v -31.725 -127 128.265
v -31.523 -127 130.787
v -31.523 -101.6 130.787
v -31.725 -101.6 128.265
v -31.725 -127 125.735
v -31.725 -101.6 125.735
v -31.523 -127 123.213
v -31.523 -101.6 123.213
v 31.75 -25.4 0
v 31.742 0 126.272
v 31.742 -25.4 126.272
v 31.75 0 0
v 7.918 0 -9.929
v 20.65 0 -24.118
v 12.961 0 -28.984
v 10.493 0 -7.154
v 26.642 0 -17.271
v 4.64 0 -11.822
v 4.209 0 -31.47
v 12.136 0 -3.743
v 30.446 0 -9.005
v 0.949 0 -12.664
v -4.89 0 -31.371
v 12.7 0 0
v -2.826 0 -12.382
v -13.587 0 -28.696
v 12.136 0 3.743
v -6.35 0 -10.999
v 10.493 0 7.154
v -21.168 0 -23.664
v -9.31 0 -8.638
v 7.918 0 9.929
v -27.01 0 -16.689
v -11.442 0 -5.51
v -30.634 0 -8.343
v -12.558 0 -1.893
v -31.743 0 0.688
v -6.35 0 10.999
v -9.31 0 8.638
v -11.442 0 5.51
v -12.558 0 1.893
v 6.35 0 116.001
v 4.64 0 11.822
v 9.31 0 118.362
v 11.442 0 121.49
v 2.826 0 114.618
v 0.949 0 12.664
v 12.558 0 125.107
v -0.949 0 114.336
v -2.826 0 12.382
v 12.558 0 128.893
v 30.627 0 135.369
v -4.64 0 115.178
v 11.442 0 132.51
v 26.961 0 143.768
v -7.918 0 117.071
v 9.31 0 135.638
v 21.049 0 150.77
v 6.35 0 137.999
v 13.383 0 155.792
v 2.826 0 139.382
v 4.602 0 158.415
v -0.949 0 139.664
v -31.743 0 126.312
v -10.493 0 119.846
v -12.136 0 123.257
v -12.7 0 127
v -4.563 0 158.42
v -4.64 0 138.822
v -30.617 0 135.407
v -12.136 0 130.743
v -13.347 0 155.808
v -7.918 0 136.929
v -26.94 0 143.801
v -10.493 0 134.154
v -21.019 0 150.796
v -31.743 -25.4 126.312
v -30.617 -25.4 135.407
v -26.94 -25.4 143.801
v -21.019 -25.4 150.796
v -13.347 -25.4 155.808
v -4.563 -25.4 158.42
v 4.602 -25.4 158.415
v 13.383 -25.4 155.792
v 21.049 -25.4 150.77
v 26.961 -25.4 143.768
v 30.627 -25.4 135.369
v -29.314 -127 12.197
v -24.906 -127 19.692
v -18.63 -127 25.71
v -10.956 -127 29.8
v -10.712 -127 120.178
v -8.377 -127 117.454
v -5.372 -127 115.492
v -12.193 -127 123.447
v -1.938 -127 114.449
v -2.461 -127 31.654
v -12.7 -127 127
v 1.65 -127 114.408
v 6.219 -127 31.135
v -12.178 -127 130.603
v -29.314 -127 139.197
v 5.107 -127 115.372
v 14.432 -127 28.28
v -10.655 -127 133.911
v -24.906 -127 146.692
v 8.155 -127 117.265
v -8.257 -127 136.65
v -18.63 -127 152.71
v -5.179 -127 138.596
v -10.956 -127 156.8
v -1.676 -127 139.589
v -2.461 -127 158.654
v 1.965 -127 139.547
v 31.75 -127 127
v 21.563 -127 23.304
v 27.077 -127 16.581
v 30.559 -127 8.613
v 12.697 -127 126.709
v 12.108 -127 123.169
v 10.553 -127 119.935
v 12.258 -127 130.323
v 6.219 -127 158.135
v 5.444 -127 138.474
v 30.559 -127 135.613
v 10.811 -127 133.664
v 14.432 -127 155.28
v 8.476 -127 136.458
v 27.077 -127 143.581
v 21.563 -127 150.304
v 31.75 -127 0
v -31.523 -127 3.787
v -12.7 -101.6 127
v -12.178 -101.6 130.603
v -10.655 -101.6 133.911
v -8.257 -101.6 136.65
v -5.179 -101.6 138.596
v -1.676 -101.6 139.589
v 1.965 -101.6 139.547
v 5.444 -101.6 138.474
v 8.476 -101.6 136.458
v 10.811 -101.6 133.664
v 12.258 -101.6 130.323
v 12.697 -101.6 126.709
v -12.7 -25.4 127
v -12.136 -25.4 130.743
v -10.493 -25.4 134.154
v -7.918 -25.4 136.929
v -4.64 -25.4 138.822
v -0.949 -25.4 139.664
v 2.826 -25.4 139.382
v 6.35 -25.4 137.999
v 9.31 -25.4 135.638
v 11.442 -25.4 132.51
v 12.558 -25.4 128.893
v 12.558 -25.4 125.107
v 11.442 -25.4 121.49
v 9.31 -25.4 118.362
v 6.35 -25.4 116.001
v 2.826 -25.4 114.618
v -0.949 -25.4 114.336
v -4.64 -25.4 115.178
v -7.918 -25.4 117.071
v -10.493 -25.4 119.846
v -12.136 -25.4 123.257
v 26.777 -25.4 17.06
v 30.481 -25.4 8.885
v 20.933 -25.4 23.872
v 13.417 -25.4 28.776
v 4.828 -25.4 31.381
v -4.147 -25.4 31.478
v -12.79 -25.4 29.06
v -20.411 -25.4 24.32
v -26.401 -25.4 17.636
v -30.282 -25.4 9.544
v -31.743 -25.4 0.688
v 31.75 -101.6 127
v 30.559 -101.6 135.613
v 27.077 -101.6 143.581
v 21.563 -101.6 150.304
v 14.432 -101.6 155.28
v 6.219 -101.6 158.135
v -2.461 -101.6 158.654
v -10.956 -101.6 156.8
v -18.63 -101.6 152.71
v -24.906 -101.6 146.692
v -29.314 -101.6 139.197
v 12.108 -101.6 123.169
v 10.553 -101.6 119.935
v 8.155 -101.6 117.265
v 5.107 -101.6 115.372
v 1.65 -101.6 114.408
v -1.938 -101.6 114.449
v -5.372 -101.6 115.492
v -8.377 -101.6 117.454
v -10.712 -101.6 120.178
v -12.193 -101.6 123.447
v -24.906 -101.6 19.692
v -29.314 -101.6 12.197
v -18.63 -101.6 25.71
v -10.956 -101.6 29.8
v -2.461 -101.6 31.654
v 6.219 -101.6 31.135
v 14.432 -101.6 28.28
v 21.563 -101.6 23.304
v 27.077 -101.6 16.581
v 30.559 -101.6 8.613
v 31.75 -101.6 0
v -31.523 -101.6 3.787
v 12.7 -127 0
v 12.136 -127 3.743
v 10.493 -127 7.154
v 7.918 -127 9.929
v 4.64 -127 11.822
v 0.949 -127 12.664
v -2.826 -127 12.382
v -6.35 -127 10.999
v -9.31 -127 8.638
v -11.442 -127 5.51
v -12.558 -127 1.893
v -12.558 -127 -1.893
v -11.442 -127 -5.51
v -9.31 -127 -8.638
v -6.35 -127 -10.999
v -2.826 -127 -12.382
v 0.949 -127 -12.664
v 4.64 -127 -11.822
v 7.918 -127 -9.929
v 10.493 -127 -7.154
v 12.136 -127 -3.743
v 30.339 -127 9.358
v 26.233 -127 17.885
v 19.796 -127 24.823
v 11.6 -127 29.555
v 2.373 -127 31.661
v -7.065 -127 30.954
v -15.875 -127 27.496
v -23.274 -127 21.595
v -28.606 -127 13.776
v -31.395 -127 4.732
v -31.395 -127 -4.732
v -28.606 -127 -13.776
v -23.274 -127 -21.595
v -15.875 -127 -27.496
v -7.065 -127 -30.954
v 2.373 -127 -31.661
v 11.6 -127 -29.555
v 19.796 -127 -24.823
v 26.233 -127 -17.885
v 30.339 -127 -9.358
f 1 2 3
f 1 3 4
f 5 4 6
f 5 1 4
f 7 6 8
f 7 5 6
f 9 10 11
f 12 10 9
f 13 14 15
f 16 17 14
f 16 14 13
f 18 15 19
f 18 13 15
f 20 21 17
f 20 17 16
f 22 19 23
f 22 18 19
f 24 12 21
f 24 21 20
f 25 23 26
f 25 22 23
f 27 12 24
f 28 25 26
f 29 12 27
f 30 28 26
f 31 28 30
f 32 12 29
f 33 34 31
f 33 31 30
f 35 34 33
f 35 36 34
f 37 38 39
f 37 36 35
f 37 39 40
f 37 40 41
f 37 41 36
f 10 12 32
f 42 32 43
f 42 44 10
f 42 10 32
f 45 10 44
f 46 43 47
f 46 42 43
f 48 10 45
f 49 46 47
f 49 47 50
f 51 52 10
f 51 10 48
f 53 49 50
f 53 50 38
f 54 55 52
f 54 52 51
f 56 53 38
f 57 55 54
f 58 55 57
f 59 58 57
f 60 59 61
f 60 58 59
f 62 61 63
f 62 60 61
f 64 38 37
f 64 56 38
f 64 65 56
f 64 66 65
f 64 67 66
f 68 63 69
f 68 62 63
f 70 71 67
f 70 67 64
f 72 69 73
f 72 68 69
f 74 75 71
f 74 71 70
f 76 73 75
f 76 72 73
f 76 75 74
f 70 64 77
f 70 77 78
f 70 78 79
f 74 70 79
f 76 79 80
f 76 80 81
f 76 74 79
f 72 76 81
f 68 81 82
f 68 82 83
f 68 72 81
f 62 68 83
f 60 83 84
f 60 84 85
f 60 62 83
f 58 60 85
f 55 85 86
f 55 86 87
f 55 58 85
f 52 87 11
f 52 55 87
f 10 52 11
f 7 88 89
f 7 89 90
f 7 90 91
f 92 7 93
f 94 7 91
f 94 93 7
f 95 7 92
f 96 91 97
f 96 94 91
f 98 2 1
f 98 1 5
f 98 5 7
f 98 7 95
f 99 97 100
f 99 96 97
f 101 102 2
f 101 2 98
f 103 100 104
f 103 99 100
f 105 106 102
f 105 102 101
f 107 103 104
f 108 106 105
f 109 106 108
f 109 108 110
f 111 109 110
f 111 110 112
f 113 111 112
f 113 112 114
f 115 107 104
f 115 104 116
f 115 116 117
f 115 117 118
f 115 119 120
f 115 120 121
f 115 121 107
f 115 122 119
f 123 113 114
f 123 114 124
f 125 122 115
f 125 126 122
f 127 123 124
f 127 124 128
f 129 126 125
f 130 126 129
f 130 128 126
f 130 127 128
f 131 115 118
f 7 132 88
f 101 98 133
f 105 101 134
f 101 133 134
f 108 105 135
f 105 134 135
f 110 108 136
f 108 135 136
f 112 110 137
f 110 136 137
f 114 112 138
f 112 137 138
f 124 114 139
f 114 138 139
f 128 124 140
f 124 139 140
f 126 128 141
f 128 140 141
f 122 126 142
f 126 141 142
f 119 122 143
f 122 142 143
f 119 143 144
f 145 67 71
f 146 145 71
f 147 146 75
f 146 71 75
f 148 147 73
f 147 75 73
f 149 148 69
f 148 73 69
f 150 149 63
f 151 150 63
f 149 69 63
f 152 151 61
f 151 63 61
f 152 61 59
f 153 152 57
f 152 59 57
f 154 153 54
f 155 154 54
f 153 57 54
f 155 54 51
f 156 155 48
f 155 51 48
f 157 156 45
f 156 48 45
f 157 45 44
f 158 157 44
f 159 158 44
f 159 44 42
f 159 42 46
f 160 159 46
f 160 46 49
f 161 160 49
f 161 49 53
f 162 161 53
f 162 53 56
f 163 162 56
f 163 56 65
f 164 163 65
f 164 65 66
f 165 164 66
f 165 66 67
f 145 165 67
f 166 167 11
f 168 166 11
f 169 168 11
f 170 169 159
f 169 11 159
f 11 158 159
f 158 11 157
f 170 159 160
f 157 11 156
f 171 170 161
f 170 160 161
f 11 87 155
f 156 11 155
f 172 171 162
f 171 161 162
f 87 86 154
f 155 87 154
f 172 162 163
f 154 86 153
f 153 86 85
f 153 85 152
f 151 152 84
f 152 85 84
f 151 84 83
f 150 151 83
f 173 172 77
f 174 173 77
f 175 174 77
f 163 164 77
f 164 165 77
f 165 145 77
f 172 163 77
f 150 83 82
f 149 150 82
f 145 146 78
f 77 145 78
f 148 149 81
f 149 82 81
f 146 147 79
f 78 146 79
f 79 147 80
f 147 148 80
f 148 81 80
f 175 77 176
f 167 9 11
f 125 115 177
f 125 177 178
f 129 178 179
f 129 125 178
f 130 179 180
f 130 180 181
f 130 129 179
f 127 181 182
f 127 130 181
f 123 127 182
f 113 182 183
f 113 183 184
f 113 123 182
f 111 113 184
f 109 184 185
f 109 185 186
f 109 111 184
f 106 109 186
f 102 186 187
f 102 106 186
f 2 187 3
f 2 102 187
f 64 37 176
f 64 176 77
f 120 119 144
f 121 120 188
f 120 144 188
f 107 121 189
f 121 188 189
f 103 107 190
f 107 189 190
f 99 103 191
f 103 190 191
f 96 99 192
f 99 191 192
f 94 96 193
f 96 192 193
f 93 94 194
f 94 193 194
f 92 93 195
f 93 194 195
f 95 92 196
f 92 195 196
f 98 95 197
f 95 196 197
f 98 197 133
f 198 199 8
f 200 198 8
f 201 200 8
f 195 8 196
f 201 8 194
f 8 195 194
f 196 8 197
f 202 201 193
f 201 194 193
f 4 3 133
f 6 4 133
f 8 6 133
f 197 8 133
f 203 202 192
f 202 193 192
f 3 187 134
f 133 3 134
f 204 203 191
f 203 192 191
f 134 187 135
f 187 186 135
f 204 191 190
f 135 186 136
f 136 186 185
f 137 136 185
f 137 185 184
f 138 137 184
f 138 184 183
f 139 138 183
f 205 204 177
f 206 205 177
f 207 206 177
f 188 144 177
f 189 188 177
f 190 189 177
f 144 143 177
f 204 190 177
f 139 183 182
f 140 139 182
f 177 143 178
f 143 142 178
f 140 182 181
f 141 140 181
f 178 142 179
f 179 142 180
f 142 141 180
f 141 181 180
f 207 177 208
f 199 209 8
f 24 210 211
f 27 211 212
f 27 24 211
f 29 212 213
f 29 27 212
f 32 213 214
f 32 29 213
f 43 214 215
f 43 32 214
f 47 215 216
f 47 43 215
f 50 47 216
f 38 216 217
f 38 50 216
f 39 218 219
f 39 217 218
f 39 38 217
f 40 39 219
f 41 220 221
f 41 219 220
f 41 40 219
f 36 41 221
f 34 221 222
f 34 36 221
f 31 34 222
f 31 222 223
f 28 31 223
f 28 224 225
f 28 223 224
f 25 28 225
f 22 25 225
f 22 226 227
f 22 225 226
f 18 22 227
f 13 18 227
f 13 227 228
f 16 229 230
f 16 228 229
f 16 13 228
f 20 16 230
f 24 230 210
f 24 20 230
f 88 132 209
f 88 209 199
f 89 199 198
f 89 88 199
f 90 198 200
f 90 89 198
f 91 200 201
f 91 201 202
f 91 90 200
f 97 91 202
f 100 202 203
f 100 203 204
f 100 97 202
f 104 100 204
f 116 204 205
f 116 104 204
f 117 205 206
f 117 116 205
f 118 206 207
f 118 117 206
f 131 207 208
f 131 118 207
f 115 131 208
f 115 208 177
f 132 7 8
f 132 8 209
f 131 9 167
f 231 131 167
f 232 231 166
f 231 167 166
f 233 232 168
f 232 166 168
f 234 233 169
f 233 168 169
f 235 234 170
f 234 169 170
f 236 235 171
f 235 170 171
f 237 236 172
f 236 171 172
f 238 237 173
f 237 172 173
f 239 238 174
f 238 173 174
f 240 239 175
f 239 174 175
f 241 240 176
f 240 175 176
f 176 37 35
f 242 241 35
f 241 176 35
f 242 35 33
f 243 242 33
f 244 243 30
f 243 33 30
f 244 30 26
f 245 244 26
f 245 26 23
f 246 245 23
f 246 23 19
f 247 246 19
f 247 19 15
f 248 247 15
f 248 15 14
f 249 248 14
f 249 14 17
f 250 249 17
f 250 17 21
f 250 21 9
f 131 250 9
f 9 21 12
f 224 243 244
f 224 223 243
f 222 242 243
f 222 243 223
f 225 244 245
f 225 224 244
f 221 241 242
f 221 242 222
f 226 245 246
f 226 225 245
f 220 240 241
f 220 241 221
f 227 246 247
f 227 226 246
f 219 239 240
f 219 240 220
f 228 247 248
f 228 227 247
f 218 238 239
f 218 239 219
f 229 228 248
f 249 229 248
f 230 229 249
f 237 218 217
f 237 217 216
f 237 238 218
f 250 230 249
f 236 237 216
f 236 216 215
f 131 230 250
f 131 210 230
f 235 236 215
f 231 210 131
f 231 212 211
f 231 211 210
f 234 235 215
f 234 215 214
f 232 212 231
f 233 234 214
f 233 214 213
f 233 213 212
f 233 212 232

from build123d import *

# Parameters (mm, degrees)
F0_R     = 31.75
F0_R_2   = 12.7
F1_DEPTH = 127
F3_DEPTH = 25.4
F5_DEPTH = 25.4
F6_R     = 12.7
F7_DEPTH = 139.7
F8_R     = 12.7
F9_DEPTH = 38.1


with BuildPart() as f1:
    # F0 (on Front) → F1 (new body)
    with BuildSketch(Plane.XZ):
        Circle(F0_R)
        Circle(F0_R_2, mode=Mode.SUBTRACT)
    extrude(amount=F1_DEPTH)

    # F4 (on face) → F5 (join)
    with BuildSketch(Plane(origin=(0, 0, 0), x_dir=(-1, 0, 0), z_dir=(0, 1, 0))):
        with BuildLine():
            ThreePointArc((-31.7500000692, 0), (-0.344186637, 31.7481344327), (31.7425377423, 0.688332825))
            Line((31.7425377423, 0.688332825), (31.7425377423, 126.311667178))
            ThreePointArc((31.7425377423, 126.311667178), (-0.0196755774, 158.7499923522), (-31.7416601672, 126.2723257371))
            Line((-31.7416601672, 126.2723257371), (-31.7500000692, 0))
        make_face()
    extrude(amount=-F5_DEPTH)


with BuildPart() as f3:
    # F2 (on face) → F3 (new body)
    with BuildSketch(Plane.XZ.offset(127)):
        with BuildLine():
            ThreePointArc((0, 31.75), (22.4506403027, 22.4506403027), (31.75, 0))
            Line((31.75, 0), (31.75, 127))
            ThreePointArc((31.75, 127), (1.8967885005, 158.6932909838), (-31.5233665124, 130.7868012523))
            Line((-31.5233665124, 130.7868012523), (-31.5233665124, 123.2131987477))
            Line((-31.5233665124, 123.2131987477), (-31.5233665124, 3.7868012523))
            ThreePointArc((-31.5233665124, 3.7868012523), (-21.0693089616, 23.7517729839), (0, 31.75))
        make_face()
        with BuildLine():
            Line((-31.5233665124, 123.2131987477), (-31.5233665124, 130.7868012523))
            ThreePointArc((-31.5233665124, 130.7868012523), (-31.75, 127), (-31.5233665124, 123.2131987477))
        make_face()
    extrude(amount=-F3_DEPTH)


with BuildPart() as f7_tool:
    # F6 (on face) → F7 (new body)
    with BuildSketch(Plane(origin=(0, 0, 0), x_dir=(-1, 0, 0), z_dir=(0, 1, 0))):
        Circle(F6_R)
        with Locations((3.56e-08, 126.9999984487)):
            Circle(F6_R)
    extrude(amount=-F7_DEPTH)


with BuildPart() as f1_1:
    add(f1.part)

    # F7: cut by f7_tool
    add(f7_tool.part, mode=Mode.SUBTRACT)


with BuildPart() as f3_1:
    add(f3.part)

    # F7: cut by f7_tool
    add(f7_tool.part, mode=Mode.SUBTRACT)

    # F8 (on face) → F9 (cut)
    with BuildSketch(Plane(origin=(0, -101.6, 0), x_dir=(-1, 0, 0), z_dir=(0, 1, 0))):
        with Locations((0, 127)):
            Circle(F8_R)
    extrude(amount=-F9_DEPTH, mode=Mode.SUBTRACT)


solid = Compound([f1_1.part, f3_1.part])
